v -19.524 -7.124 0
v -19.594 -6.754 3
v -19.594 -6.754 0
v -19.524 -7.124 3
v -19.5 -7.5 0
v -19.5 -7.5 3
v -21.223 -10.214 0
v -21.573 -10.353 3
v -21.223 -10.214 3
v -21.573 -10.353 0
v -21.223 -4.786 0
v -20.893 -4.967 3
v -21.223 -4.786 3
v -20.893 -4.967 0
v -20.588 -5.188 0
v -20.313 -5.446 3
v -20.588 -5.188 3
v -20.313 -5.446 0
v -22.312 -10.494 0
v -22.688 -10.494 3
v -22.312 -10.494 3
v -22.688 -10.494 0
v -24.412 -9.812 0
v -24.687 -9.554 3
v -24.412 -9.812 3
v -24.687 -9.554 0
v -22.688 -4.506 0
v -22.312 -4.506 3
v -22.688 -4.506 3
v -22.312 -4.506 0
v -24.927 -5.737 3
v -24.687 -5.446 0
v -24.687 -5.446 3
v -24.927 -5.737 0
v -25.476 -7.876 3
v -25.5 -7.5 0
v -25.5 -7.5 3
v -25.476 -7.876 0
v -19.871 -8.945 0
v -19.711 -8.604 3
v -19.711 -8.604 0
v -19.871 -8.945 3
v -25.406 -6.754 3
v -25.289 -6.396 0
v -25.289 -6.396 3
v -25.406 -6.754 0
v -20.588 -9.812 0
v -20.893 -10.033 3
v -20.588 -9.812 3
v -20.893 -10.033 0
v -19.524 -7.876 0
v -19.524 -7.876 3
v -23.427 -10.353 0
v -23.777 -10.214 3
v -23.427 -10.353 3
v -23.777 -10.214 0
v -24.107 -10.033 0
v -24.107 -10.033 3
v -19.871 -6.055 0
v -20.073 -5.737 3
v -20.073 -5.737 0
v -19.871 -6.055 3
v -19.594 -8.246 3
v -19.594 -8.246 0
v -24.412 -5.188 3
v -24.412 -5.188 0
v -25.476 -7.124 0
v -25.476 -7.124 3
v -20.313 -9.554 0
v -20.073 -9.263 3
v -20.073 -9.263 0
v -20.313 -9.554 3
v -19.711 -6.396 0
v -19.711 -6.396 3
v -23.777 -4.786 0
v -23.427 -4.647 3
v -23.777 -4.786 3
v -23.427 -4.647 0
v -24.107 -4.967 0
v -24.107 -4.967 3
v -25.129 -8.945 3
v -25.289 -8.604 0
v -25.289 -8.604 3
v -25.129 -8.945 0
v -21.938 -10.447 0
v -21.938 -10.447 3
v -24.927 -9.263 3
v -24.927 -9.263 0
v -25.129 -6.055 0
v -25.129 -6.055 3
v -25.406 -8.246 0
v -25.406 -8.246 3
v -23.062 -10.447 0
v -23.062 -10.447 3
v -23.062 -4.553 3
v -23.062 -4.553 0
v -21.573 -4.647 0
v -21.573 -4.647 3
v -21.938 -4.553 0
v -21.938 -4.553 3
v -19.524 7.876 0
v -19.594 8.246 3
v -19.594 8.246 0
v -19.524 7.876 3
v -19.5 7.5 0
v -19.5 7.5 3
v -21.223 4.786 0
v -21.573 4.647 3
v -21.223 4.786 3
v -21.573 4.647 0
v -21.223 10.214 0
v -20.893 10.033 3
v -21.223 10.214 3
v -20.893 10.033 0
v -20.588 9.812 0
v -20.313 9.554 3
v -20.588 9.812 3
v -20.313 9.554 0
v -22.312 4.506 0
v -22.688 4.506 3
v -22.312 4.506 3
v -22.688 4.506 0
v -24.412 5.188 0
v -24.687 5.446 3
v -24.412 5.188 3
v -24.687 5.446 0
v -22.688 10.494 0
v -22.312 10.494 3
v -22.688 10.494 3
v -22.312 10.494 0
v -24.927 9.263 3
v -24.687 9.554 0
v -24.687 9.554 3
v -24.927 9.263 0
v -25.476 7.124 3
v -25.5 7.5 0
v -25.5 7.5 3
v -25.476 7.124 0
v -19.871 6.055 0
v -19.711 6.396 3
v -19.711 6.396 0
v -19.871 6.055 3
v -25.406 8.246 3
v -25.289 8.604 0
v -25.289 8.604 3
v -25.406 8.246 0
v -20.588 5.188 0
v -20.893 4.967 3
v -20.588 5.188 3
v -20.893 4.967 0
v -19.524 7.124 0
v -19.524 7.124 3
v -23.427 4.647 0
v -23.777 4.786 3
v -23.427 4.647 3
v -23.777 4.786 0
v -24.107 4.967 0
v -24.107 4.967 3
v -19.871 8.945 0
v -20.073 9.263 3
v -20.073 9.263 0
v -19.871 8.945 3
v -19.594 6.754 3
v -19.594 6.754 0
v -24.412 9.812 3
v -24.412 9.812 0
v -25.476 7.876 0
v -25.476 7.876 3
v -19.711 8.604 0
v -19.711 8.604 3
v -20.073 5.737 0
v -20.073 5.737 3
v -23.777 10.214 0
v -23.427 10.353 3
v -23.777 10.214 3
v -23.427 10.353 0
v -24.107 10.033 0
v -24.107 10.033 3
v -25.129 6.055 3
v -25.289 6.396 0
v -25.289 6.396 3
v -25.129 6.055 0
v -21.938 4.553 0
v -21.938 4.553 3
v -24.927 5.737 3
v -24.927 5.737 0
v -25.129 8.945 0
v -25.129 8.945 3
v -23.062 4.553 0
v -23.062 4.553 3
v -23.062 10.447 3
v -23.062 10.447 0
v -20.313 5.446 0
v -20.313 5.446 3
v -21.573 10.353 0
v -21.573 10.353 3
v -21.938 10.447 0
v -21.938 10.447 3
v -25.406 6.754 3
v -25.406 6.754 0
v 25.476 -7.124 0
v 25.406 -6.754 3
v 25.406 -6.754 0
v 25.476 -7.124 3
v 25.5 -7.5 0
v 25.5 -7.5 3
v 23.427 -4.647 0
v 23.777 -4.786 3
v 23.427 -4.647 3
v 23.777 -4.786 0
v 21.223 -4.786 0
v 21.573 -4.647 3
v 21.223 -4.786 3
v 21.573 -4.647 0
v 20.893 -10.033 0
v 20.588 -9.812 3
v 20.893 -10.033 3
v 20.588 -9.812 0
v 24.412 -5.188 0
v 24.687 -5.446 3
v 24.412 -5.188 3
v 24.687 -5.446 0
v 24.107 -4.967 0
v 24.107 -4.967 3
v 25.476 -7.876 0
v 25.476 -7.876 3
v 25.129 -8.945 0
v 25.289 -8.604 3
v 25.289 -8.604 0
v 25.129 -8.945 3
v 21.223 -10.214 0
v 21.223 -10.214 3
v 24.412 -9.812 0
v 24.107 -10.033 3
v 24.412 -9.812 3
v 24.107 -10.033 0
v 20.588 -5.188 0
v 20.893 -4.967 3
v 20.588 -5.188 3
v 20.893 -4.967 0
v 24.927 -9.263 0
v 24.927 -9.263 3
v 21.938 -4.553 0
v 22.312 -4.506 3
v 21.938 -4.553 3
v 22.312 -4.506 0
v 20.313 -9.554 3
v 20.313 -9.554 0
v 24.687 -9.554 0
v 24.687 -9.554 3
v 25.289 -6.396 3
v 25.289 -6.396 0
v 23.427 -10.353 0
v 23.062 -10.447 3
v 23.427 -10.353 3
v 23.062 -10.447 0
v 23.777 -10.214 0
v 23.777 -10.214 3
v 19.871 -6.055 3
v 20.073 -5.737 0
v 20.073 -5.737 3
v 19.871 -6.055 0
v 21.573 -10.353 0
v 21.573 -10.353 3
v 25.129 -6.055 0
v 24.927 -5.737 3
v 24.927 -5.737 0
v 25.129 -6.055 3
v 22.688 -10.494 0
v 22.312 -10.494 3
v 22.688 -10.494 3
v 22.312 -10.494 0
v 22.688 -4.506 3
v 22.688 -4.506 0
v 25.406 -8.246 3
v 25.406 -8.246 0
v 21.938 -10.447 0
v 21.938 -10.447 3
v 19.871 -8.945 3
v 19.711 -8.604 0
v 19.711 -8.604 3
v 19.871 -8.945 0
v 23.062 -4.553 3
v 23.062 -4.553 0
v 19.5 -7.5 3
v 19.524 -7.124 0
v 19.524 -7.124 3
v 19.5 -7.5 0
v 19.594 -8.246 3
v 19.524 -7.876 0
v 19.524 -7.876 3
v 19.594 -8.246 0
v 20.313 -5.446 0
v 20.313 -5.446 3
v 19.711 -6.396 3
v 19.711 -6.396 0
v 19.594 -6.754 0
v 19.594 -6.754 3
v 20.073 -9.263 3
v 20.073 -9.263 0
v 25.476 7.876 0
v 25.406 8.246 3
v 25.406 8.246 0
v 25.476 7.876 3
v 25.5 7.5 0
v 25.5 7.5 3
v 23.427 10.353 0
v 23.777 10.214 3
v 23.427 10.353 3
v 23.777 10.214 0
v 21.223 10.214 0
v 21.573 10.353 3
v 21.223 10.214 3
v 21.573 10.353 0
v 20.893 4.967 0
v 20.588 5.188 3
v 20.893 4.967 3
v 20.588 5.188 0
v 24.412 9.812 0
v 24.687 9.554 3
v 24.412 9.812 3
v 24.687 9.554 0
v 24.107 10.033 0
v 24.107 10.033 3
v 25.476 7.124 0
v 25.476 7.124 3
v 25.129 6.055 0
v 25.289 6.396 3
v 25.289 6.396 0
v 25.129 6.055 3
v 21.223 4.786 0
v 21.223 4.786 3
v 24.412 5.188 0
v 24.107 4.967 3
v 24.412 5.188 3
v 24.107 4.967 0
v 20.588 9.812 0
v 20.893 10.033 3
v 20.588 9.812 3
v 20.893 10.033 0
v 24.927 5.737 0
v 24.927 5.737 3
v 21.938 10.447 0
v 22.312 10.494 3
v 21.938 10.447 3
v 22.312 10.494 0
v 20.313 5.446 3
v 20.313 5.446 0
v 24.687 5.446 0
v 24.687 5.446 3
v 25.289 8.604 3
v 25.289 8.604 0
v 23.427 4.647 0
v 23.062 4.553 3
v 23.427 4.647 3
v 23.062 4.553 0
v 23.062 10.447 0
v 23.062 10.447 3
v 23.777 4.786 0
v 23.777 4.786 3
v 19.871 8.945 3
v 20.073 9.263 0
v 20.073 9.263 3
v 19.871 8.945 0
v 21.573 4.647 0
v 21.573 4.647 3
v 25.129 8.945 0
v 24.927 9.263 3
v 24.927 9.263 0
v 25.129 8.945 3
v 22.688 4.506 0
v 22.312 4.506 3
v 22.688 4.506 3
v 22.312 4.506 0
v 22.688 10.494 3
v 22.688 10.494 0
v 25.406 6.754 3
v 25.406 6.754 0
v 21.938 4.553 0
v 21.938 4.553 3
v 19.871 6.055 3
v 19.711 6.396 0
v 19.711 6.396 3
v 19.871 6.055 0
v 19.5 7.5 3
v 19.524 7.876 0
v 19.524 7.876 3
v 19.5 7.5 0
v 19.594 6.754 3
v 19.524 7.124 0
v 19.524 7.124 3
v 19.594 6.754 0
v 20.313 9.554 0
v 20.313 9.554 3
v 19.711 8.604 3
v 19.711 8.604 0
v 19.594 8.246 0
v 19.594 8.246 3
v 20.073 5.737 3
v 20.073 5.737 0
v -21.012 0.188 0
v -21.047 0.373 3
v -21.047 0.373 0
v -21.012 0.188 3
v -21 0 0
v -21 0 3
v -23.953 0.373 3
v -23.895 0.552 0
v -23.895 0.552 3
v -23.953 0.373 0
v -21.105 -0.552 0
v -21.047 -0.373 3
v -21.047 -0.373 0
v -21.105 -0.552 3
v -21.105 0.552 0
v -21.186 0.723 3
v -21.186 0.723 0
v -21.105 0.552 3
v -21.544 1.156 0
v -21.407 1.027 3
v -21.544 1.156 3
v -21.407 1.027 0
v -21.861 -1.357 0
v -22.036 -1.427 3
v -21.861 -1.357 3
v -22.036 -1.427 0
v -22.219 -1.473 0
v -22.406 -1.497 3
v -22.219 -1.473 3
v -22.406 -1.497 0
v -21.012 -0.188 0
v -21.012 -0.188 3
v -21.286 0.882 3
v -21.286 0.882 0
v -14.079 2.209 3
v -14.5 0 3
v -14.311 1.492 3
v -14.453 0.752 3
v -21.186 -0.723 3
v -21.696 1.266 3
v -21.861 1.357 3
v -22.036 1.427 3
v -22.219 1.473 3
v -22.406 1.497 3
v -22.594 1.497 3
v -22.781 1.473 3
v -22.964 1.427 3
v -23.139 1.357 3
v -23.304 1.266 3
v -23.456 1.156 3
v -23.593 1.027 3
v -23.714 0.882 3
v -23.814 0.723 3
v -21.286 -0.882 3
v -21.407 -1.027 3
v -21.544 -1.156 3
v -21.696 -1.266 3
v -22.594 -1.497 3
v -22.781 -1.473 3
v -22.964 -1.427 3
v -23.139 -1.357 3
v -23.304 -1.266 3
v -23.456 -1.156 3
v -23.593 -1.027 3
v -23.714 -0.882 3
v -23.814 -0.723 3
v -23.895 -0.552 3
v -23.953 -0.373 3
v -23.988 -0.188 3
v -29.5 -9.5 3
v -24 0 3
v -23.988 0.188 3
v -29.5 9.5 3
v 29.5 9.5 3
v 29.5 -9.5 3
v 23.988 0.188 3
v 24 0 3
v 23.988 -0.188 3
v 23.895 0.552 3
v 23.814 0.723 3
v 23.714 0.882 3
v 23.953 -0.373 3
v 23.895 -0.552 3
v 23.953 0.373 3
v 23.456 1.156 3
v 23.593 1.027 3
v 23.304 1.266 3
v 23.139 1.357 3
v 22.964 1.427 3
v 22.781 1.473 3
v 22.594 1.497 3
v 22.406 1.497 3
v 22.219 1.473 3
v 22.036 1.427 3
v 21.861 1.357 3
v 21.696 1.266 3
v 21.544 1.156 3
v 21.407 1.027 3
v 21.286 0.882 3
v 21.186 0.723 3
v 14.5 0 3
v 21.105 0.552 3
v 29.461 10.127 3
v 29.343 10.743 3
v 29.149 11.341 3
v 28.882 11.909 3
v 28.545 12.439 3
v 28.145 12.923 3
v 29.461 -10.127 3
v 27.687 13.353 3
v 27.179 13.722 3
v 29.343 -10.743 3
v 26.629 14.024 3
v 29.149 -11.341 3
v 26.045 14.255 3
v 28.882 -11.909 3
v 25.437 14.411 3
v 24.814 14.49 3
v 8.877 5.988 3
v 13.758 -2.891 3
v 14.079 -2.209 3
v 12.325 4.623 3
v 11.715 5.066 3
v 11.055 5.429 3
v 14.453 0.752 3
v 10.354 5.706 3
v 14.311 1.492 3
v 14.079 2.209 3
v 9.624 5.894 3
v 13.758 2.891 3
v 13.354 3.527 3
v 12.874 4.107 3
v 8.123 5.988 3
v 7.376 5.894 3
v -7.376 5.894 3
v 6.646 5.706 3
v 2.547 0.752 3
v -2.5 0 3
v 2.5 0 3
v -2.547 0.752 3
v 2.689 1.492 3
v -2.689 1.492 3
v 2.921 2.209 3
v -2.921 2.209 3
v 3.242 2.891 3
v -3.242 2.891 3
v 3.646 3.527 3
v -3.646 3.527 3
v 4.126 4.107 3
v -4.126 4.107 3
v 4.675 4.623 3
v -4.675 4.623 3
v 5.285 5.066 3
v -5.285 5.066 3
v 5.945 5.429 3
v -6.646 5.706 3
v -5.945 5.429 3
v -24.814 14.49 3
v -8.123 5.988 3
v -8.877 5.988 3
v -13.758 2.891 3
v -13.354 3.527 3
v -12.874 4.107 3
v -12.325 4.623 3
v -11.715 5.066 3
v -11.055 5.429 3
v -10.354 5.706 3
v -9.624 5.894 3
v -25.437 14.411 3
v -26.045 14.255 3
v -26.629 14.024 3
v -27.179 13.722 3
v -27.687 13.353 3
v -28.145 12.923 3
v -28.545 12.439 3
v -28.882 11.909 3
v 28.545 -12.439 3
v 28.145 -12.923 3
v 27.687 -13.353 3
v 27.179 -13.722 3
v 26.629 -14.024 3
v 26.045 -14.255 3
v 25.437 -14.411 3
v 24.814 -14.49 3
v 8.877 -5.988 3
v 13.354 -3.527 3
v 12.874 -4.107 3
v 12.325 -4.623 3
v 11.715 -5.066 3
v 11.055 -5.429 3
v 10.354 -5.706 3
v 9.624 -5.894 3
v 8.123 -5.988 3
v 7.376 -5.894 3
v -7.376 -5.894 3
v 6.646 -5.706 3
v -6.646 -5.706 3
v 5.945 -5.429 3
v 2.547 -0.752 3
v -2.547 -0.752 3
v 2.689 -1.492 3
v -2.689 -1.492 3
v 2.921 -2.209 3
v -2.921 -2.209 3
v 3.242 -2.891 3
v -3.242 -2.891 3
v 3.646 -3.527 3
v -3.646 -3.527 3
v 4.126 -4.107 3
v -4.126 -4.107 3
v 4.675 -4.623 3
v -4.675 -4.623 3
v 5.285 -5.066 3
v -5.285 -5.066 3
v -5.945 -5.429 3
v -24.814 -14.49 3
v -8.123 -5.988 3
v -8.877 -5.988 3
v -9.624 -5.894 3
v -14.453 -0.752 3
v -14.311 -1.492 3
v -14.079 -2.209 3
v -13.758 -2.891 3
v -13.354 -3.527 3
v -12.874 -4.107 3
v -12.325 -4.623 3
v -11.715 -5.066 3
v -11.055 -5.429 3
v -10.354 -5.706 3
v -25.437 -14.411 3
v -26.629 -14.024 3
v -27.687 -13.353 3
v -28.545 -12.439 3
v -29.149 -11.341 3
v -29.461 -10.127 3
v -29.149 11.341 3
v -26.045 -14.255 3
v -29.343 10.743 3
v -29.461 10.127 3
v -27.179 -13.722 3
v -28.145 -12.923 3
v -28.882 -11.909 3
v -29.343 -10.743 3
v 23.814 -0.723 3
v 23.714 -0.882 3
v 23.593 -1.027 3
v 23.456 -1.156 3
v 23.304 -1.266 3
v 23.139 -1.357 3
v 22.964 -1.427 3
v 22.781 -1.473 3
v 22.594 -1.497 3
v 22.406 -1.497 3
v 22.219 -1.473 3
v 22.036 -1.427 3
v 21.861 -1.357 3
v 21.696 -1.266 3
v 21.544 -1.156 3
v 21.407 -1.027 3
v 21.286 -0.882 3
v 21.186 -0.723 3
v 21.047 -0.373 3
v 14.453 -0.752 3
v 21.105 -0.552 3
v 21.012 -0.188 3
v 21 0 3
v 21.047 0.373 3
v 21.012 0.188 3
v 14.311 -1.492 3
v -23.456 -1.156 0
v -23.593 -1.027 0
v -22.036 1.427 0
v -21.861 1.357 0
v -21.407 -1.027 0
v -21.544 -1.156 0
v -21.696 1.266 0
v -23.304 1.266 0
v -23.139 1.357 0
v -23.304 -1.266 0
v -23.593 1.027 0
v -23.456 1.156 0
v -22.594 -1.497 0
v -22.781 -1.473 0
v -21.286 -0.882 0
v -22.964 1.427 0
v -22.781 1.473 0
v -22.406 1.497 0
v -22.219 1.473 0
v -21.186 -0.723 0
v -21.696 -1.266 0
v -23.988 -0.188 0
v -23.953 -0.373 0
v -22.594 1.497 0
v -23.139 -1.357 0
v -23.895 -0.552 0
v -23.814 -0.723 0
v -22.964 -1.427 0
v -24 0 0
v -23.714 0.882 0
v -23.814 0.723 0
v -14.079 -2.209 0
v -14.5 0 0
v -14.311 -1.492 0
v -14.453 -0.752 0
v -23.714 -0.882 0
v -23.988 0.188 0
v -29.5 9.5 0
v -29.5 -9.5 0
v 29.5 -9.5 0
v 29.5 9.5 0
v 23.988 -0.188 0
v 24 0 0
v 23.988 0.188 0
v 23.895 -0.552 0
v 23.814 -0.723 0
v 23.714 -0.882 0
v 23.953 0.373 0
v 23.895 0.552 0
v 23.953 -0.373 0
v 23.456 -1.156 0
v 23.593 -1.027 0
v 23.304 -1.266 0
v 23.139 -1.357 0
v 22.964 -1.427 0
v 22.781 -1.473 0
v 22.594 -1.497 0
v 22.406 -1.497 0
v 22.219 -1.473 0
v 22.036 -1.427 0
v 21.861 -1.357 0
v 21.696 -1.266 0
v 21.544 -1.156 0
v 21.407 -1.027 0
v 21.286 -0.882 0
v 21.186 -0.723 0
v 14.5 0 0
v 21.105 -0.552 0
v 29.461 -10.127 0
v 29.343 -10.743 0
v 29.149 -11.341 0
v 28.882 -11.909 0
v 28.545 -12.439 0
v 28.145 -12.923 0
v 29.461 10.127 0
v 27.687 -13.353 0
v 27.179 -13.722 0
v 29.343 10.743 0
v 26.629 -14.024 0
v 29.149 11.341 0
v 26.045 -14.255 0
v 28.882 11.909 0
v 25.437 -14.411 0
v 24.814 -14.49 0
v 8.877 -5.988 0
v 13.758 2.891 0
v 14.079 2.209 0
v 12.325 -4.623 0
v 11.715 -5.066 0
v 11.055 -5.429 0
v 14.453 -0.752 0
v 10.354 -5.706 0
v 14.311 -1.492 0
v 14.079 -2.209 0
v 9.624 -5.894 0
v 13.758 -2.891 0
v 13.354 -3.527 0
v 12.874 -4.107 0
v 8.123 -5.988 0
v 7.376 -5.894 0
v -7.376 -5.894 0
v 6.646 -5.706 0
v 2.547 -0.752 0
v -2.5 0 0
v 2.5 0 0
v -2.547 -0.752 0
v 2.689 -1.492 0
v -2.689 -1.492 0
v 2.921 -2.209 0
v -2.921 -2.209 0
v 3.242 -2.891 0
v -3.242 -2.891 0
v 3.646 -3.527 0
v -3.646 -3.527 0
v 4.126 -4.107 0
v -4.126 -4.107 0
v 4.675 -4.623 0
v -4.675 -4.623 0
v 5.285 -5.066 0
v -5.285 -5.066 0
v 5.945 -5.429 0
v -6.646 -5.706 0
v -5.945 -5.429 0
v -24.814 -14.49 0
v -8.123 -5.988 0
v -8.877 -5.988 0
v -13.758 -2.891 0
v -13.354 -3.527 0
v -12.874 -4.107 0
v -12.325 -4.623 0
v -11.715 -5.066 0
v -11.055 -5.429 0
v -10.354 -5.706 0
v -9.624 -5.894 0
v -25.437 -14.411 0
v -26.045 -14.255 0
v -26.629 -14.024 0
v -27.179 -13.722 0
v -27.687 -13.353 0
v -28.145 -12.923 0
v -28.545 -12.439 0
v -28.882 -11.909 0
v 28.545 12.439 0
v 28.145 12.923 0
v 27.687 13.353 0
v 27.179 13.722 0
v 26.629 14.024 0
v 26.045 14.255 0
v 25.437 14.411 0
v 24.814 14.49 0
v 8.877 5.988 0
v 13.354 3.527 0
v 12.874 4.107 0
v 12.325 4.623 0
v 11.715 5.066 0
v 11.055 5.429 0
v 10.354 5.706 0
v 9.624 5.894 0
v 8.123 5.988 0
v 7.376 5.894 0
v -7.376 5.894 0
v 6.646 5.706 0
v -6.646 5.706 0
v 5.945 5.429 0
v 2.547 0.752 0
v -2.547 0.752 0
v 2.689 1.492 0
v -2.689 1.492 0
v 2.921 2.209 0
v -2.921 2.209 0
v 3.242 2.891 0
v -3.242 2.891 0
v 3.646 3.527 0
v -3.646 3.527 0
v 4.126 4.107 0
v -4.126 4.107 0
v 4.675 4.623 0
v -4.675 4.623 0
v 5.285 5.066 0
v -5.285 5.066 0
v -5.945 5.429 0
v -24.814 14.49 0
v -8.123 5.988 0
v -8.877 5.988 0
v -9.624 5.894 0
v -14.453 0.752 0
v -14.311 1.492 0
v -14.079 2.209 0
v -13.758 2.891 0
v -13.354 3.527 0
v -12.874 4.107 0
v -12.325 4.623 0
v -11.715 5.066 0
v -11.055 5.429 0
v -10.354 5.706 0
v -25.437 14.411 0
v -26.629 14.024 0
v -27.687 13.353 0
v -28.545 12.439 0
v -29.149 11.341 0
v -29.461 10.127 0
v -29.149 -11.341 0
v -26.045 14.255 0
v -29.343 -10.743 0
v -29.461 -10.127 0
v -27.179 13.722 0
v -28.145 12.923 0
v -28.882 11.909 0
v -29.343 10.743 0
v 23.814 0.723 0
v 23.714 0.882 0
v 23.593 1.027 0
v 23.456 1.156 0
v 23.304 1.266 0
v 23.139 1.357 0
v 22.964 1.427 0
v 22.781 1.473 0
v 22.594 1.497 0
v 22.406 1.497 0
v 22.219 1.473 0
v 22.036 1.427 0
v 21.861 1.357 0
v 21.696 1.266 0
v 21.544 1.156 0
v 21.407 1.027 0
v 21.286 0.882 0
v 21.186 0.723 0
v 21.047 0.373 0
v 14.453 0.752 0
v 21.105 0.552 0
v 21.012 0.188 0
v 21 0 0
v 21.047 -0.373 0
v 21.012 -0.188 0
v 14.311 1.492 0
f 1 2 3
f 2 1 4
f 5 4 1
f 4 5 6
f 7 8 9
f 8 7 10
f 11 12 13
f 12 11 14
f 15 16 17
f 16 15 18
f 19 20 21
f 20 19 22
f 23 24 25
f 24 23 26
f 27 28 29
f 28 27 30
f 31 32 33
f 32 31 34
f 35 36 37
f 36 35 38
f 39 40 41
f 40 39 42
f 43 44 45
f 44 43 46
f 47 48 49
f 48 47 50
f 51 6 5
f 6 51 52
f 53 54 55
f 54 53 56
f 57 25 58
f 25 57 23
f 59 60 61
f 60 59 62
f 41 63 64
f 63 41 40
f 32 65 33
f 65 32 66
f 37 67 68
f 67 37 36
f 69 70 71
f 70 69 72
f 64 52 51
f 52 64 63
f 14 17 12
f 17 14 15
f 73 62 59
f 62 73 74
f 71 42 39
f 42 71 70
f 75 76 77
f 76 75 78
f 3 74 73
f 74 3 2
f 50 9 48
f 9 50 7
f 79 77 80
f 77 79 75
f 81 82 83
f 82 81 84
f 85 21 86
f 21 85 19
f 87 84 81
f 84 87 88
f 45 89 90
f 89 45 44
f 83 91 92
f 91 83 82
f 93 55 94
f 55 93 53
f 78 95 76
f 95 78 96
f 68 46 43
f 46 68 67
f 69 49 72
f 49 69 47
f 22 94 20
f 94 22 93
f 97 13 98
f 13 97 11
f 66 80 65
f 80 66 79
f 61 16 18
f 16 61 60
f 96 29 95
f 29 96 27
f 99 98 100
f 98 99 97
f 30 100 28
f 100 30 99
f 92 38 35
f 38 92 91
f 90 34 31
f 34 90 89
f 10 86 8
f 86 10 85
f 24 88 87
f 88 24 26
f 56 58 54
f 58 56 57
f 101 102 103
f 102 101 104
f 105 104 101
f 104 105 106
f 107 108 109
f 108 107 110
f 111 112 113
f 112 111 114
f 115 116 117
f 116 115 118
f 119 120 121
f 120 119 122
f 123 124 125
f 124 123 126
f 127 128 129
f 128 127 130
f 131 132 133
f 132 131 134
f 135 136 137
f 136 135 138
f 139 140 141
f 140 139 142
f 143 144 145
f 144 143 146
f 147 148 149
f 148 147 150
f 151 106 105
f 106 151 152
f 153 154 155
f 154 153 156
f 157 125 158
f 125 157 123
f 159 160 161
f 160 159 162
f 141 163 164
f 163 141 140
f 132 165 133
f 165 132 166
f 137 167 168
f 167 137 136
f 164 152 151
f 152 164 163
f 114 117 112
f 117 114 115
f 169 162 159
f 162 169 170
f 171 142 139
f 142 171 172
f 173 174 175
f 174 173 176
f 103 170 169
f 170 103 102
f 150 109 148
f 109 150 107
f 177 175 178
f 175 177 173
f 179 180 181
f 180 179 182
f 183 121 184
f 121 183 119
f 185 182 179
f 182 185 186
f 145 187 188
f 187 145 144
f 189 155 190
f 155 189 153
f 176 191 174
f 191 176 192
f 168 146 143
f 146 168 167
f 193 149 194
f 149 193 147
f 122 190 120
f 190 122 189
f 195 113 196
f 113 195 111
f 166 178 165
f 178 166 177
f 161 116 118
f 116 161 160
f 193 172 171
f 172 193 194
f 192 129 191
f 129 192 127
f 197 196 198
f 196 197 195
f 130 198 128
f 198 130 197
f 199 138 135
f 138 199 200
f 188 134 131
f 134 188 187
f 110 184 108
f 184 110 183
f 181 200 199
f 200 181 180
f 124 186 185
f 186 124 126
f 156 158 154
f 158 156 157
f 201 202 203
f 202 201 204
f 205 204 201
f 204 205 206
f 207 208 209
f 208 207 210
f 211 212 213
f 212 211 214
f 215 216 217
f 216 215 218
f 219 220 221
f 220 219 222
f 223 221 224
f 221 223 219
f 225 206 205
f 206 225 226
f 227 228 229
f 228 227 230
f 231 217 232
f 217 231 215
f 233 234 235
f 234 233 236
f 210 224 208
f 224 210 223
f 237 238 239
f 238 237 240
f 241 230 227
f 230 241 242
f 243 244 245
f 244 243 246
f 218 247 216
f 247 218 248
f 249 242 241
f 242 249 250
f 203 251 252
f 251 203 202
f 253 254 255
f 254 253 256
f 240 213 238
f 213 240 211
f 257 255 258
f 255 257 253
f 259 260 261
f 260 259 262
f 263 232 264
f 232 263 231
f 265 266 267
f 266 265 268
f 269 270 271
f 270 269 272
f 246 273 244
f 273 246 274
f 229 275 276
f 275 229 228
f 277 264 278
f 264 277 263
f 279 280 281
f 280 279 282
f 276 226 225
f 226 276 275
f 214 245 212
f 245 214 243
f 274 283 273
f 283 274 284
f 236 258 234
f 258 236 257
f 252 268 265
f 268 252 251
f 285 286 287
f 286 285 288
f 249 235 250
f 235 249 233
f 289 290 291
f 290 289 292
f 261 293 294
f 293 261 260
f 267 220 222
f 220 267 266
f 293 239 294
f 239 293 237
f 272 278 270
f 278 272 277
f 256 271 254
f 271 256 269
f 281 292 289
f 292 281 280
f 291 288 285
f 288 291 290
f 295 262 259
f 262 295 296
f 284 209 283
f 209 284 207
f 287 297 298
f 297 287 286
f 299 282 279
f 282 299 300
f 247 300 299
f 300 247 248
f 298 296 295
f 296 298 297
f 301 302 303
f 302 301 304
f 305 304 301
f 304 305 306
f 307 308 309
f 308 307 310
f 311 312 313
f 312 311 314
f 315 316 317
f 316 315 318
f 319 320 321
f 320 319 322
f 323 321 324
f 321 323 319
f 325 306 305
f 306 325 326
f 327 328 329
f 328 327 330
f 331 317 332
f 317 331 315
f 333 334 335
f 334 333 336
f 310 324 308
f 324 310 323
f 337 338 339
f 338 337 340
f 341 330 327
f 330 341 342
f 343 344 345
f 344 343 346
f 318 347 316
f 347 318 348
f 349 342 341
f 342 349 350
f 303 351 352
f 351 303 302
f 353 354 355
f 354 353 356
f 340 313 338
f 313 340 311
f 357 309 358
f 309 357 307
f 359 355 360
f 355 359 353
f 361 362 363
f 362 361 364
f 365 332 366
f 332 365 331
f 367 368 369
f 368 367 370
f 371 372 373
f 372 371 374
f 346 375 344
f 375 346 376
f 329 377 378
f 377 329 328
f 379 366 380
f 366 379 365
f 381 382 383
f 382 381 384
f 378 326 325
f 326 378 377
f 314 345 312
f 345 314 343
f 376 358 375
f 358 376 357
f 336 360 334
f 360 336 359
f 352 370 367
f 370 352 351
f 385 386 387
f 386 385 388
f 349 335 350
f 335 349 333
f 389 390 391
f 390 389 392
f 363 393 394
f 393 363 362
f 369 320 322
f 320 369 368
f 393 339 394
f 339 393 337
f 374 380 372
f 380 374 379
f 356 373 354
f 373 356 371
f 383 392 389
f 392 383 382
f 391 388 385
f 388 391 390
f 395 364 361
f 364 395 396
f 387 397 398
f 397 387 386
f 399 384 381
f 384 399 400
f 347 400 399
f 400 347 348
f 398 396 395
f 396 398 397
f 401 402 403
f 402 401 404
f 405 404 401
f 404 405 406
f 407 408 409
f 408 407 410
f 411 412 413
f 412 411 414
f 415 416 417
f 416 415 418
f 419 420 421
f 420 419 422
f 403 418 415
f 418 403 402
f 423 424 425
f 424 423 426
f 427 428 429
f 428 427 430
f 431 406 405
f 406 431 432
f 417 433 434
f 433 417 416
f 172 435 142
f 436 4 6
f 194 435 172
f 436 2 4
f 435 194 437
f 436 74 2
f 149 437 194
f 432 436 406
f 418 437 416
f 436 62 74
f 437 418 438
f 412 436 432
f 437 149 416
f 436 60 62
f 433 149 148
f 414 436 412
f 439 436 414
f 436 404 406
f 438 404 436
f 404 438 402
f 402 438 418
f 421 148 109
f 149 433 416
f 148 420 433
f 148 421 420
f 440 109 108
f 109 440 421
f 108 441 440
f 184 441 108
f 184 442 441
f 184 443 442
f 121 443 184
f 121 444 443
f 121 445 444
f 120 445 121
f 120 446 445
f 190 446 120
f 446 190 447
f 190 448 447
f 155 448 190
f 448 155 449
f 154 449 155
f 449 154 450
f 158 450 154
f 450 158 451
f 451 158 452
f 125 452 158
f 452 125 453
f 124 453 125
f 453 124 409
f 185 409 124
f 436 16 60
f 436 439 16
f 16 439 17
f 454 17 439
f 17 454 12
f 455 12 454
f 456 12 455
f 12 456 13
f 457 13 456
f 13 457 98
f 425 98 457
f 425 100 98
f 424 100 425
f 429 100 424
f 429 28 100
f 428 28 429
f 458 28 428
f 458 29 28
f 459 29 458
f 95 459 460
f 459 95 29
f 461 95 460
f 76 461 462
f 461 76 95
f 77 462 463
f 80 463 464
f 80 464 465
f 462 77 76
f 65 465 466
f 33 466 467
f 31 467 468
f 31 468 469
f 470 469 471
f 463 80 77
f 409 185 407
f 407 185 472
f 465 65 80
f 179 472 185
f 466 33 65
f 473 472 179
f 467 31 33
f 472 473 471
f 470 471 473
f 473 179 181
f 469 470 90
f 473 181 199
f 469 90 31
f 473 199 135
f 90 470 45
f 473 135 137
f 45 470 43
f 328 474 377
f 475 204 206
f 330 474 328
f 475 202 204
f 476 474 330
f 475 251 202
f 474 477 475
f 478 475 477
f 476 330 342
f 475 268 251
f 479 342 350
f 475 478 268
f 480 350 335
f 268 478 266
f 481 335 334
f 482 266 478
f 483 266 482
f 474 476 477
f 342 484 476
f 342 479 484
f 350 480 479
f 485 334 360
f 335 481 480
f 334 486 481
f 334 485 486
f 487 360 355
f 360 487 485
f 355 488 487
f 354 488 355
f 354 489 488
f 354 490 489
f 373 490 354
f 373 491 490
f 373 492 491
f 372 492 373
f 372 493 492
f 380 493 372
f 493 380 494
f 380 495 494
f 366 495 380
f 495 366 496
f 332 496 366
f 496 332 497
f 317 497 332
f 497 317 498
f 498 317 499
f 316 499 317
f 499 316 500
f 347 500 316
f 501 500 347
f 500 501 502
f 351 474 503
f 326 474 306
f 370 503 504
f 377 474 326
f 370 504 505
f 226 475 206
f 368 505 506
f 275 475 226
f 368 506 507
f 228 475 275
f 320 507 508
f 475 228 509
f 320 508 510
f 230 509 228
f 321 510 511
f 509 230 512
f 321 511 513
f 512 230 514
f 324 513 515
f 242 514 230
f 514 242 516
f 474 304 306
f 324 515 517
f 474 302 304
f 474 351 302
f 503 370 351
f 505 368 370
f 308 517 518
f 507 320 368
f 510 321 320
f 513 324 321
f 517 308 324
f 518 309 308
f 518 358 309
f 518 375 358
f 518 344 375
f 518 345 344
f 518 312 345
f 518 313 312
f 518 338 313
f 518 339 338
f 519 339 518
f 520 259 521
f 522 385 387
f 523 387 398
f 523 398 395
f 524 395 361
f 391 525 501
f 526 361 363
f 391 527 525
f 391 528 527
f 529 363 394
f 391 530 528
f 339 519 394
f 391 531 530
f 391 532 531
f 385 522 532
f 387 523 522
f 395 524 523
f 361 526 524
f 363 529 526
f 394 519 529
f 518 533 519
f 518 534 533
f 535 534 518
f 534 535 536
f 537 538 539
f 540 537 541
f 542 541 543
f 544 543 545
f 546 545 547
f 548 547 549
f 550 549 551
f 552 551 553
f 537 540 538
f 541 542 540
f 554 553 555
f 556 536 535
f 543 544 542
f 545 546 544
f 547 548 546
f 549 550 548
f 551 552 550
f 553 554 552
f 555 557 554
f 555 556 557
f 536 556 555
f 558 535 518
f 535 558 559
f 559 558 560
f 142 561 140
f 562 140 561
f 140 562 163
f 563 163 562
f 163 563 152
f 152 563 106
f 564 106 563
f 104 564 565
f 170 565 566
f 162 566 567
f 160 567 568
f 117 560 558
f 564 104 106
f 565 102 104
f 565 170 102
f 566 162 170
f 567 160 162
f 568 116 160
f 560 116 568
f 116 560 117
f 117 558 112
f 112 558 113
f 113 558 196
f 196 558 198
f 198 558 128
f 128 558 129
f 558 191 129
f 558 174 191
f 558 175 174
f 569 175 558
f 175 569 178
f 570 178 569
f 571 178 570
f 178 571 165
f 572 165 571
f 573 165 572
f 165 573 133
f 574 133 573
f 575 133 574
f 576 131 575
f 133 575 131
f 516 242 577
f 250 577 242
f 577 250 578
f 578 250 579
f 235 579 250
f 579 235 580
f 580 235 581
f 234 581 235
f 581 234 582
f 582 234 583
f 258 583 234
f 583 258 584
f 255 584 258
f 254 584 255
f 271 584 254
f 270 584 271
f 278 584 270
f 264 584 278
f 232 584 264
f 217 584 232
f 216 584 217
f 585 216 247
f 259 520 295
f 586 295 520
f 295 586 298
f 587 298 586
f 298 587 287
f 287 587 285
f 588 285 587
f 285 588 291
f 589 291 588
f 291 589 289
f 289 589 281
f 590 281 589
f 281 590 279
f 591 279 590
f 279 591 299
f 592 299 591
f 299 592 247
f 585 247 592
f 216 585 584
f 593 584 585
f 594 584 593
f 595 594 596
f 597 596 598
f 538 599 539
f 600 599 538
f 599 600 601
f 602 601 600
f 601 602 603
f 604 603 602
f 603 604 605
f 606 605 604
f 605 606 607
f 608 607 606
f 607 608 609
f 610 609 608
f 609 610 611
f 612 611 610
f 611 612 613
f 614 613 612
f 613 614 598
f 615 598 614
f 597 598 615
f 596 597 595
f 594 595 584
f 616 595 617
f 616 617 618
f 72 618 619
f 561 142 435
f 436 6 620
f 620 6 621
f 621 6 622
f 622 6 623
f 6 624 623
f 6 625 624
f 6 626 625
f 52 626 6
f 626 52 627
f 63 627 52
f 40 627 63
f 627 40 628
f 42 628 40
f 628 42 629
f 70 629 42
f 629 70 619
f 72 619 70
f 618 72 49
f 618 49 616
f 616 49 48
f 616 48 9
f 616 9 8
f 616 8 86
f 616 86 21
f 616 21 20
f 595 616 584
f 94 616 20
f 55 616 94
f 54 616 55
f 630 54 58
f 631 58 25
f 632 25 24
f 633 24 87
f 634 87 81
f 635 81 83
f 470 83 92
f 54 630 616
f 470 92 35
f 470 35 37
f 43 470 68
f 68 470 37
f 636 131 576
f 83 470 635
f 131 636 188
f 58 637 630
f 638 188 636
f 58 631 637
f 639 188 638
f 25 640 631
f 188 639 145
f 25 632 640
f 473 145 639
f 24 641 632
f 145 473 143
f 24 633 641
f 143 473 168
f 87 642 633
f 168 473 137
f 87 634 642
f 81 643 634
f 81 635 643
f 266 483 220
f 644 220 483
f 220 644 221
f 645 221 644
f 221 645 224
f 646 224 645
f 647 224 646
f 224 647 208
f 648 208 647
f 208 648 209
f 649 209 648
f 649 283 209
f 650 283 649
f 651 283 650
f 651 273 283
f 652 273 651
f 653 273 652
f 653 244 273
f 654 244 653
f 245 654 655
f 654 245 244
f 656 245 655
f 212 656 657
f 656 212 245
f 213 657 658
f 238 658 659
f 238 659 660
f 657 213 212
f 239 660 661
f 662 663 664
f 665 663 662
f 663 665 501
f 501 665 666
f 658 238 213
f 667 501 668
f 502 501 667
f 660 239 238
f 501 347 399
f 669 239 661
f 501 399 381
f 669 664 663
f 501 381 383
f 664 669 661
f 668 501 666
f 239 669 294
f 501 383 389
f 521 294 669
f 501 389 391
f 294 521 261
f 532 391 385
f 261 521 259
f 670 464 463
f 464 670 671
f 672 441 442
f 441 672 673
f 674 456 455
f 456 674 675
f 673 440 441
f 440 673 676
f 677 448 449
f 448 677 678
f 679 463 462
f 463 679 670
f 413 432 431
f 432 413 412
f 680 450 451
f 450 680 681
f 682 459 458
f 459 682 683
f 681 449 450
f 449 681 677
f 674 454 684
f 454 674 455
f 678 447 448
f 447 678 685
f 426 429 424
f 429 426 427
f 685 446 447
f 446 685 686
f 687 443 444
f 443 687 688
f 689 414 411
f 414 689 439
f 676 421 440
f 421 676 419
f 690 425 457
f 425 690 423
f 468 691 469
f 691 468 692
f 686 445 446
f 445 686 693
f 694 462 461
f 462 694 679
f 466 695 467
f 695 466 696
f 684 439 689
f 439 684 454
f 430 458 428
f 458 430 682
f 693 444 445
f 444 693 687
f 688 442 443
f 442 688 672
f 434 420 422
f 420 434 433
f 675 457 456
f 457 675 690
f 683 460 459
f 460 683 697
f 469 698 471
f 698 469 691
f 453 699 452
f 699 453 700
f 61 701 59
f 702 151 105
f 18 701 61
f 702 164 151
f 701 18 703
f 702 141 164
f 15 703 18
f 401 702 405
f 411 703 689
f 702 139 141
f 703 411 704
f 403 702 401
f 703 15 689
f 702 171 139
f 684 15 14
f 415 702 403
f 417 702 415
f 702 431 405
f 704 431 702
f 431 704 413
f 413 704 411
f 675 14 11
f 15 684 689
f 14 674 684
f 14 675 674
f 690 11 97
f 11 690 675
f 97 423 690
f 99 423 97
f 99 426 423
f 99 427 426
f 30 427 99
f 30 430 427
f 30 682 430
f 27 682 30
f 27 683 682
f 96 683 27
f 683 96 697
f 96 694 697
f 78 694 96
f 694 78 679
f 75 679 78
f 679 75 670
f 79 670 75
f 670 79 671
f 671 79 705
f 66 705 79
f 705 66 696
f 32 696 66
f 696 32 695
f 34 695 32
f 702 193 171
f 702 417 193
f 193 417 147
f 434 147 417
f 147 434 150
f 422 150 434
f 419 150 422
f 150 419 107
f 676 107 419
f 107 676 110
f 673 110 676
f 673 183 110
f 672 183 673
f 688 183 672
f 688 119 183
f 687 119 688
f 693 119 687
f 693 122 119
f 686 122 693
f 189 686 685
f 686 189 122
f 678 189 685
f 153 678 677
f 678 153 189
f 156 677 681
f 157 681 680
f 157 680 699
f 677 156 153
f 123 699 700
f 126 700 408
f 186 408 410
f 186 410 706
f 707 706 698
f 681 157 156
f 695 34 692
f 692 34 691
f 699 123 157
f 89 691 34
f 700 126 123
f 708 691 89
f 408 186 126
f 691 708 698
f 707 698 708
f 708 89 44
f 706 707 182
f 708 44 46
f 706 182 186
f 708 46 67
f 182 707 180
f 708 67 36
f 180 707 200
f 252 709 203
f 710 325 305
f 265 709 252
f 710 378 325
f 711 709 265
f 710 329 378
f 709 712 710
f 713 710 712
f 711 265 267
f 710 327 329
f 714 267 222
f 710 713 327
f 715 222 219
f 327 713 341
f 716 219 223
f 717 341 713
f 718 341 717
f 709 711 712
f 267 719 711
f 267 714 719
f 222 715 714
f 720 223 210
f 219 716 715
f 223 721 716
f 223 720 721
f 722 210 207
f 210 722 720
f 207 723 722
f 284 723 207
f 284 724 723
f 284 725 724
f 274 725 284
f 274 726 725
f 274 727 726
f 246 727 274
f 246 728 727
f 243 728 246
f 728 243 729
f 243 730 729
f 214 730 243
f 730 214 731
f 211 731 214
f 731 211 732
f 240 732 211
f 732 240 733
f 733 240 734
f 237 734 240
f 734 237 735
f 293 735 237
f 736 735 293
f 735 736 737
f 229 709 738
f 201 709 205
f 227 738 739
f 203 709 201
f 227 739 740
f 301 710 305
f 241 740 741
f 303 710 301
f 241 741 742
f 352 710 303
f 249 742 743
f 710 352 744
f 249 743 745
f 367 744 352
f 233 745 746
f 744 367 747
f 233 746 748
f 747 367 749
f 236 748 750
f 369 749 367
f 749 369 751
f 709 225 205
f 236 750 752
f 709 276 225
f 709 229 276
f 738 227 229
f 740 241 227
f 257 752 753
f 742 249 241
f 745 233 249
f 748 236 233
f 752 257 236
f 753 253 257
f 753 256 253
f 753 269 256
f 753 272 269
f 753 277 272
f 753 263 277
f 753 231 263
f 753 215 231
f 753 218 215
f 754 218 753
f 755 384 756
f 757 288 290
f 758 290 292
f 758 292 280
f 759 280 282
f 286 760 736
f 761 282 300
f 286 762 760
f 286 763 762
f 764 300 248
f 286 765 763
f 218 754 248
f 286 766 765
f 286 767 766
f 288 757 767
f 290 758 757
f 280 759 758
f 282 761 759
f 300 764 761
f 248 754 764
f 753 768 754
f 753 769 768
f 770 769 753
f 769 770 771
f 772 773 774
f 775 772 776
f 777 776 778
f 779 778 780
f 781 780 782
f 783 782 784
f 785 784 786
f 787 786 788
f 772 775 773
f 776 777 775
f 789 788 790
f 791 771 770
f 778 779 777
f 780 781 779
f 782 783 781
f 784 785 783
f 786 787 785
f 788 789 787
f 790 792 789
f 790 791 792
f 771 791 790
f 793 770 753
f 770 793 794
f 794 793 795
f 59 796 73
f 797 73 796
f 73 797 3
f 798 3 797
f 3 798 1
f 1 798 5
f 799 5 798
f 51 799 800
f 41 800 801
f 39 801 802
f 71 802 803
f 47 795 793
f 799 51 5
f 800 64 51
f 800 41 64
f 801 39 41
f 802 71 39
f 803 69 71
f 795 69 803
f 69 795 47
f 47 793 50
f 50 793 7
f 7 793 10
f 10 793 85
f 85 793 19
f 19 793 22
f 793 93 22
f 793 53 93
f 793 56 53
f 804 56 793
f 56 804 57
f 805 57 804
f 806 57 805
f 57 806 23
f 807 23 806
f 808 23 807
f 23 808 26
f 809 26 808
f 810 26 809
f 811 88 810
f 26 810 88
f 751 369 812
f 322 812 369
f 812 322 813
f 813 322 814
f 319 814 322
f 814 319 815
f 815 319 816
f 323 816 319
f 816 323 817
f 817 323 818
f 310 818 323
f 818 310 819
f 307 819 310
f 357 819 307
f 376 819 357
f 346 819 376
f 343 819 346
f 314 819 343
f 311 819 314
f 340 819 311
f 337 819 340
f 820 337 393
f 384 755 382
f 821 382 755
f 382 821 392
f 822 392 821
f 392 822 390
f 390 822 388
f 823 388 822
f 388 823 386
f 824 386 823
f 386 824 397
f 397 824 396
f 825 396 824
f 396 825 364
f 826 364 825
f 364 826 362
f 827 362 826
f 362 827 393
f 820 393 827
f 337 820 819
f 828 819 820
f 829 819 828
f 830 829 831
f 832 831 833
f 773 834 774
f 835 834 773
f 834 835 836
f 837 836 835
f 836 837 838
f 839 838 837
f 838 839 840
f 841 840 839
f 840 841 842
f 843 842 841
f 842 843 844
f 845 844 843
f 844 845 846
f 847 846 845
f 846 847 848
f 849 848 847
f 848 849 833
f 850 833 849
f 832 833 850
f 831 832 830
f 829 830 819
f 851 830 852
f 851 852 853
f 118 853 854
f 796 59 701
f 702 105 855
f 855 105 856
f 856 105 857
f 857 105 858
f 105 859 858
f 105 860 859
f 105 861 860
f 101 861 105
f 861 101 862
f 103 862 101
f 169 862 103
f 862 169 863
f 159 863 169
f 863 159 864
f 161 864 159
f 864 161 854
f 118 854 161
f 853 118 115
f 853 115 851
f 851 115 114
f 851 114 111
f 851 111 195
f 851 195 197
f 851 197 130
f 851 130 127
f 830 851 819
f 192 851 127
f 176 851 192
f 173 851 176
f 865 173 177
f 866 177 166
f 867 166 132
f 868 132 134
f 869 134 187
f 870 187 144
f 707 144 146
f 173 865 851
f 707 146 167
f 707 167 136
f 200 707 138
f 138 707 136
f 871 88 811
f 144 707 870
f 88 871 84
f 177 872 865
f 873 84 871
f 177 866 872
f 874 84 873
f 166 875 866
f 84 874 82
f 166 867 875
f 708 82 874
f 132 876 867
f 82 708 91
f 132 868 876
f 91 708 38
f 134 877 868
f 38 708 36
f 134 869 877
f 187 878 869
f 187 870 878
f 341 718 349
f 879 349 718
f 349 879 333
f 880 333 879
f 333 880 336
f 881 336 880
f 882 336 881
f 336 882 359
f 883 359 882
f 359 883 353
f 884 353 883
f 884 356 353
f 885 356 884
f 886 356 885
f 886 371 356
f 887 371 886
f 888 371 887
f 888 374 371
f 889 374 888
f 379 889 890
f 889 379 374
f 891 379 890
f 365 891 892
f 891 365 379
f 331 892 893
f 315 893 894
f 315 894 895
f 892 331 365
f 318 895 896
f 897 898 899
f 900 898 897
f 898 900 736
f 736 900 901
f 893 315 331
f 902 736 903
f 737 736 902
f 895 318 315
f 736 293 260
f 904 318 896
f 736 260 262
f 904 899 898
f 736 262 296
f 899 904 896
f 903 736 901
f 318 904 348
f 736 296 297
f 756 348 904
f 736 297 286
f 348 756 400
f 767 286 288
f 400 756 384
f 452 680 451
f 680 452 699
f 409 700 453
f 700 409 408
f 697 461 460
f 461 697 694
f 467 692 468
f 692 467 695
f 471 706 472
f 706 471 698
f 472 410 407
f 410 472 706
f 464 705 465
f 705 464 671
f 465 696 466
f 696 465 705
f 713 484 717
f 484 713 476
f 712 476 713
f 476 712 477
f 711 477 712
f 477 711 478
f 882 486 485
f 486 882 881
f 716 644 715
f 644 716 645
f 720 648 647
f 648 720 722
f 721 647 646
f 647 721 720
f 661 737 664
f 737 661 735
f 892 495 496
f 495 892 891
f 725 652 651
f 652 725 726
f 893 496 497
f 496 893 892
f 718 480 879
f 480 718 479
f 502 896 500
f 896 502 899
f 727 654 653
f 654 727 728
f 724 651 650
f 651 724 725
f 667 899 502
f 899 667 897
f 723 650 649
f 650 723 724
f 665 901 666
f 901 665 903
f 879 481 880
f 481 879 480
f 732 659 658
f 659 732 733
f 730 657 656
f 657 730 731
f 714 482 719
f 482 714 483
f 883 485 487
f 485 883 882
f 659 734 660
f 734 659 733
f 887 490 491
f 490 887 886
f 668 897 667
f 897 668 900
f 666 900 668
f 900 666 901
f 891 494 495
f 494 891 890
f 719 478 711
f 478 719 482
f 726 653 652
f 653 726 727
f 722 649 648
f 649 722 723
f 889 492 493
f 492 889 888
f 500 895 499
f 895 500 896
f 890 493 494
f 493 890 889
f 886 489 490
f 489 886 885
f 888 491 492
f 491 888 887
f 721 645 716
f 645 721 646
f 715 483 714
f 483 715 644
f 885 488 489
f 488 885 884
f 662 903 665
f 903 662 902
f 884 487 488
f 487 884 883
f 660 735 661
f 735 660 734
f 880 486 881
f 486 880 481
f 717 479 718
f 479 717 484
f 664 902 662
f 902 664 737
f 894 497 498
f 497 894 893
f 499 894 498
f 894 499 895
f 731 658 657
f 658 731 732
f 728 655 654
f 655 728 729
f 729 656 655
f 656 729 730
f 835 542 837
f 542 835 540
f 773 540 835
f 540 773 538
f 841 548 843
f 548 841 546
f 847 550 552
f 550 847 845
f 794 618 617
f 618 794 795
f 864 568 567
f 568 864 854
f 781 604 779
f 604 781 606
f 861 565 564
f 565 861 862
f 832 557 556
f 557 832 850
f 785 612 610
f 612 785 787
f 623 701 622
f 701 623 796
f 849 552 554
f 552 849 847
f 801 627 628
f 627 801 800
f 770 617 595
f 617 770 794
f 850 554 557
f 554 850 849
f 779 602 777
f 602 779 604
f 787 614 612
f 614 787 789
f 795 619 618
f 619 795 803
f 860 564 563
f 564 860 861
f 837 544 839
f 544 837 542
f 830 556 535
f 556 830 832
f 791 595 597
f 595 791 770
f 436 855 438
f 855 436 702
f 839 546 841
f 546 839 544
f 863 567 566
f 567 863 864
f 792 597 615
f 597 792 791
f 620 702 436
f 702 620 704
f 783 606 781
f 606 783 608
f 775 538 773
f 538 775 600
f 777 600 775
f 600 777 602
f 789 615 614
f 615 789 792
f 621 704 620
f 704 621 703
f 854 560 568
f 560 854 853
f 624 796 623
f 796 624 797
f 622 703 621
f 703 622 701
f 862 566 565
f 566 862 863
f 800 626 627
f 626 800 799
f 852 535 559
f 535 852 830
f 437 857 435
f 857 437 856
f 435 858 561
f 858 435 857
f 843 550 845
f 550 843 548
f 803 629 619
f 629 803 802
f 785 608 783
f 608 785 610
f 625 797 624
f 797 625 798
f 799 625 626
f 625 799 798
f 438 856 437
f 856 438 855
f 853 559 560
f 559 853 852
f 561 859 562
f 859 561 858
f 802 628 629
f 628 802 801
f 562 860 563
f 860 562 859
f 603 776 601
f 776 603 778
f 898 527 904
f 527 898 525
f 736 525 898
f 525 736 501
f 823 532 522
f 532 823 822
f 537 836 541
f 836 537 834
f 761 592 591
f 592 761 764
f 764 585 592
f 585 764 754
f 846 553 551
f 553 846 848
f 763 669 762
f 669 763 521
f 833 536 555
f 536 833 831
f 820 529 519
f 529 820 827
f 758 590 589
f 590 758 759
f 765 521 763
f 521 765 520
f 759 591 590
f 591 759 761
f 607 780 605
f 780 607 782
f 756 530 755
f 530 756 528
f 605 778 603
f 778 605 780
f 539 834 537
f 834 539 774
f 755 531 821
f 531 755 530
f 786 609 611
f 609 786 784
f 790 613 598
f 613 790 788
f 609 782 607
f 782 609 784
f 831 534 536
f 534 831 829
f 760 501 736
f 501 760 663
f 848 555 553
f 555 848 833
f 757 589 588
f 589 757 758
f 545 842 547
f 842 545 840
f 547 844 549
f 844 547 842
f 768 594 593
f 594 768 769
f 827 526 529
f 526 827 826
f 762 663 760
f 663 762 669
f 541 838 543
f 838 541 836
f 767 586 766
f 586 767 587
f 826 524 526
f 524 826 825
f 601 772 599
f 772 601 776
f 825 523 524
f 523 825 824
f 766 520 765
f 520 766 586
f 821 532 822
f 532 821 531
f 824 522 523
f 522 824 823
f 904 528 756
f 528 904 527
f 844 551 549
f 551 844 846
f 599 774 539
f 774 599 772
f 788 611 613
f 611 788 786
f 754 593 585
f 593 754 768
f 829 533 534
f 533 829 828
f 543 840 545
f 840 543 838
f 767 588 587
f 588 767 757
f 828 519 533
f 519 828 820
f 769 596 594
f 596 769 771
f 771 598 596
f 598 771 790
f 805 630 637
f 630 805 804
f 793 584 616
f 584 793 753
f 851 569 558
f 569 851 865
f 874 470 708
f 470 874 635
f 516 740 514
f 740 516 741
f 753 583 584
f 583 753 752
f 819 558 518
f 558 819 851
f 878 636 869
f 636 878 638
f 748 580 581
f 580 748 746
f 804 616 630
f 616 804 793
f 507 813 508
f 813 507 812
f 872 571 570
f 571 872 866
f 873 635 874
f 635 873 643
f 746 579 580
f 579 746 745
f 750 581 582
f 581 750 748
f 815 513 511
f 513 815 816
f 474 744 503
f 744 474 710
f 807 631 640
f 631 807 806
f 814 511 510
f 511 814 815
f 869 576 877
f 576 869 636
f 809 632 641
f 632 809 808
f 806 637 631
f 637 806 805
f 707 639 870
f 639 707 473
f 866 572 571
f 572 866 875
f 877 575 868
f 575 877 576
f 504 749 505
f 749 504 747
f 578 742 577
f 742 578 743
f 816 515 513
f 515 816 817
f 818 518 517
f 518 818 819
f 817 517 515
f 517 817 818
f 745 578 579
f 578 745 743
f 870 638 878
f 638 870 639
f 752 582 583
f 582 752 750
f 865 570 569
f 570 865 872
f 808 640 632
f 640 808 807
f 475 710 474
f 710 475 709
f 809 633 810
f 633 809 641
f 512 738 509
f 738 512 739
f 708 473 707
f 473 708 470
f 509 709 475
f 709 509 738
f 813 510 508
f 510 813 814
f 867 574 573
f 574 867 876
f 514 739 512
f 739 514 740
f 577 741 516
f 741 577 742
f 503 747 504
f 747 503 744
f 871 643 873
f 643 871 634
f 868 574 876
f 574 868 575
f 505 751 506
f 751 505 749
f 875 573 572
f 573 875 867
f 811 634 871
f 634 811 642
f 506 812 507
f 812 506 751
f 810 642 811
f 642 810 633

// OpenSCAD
$fn = 50;


difference() {
	union() {
		hull() {
			translate(v = [-24.5000000000, 9.5000000000, 0]) {
				cylinder(h = 3, r = 5);
			}
			translate(v = [24.5000000000, 9.5000000000, 0]) {
				cylinder(h = 3, r = 5);
			}
			translate(v = [-24.5000000000, -9.5000000000, 0]) {
				cylinder(h = 3, r = 5);
			}
			translate(v = [24.5000000000, -9.5000000000, 0]) {
				cylinder(h = 3, r = 5);
			}
		}
	}
	union() {
		#translate(v = [-22.5000000000, -7.5000000000, 0]) {
			cylinder(h = 3, r = 3.0000000000);
		}
		#translate(v = [-22.5000000000, 7.5000000000, 0]) {
			cylinder(h = 3, r = 3.0000000000);
		}
		#translate(v = [22.5000000000, -7.5000000000, 0]) {
			cylinder(h = 3, r = 3.0000000000);
		}
		#translate(v = [22.5000000000, 7.5000000000, 0]) {
			cylinder(h = 3, r = 3.0000000000);
		}
		#translate(v = [-22.5000000000, -7.5000000000, -100.0000000000]) {
			cylinder(h = 200, r = 3.0000000000);
		}
		#translate(v = [-22.5000000000, 7.5000000000, -100.0000000000]) {
			cylinder(h = 200, r = 3.0000000000);
		}
		#translate(v = [22.5000000000, -7.5000000000, -100.0000000000]) {
			cylinder(h = 200, r = 3.0000000000);
		}
		#translate(v = [22.5000000000, 7.5000000000, -100.0000000000]) {
			cylinder(h = 200, r = 3.0000000000);
		}
		#translate(v = [-22.5000000000, -7.5000000000, 0]) {
			cylinder(h = 3, r = 1.5000000000);
		}
		#translate(v = [-22.5000000000, 0.0000000000, 0]) {
			cylinder(h = 3, r = 1.5000000000);
		}
		#translate(v = [-22.5000000000, 7.5000000000, 0]) {
			cylinder(h = 3, r = 1.5000000000);
		}
		#translate(v = [22.5000000000, -7.5000000000, 0]) {
			cylinder(h = 3, r = 1.5000000000);
		}
		#translate(v = [22.5000000000, 0.0000000000, 0]) {
			cylinder(h = 3, r = 1.5000000000);
		}
		#translate(v = [22.5000000000, 7.5000000000, 0]) {
			cylinder(h = 3, r = 1.5000000000);
		}
		#translate(v = [-22.5000000000, -7.5000000000, 0]) {
			cylinder(h = 3, r = 1.5000000000);
		}
		#translate(v = [-22.5000000000, 0.0000000000, 0]) {
			cylinder(h = 3, r = 1.5000000000);
		}
		#translate(v = [-22.5000000000, 7.5000000000, 0]) {
			cylinder(h = 3, r = 1.5000000000);
		}
		#translate(v = [22.5000000000, -7.5000000000, 0]) {
			cylinder(h = 3, r = 1.5000000000);
		}
		#translate(v = [22.5000000000, 0.0000000000, 0]) {
			cylinder(h = 3, r = 1.5000000000);
		}
		#translate(v = [22.5000000000, 7.5000000000, 0]) {
			cylinder(h = 3, r = 1.5000000000);
		}
		#translate(v = [-22.5000000000, -7.5000000000, 0]) {
			cylinder(h = 3, r = 1.5000000000);
		}
		#translate(v = [-22.5000000000, 0.0000000000, 0]) {
			cylinder(h = 3, r = 1.5000000000);
		}
		#translate(v = [-22.5000000000, 7.5000000000, 0]) {
			cylinder(h = 3, r = 1.5000000000);
		}
		#translate(v = [22.5000000000, -7.5000000000, 0]) {
			cylinder(h = 3, r = 1.5000000000);
		}
		#translate(v = [22.5000000000, 0.0000000000, 0]) {
			cylinder(h = 3, r = 1.5000000000);
		}
		#translate(v = [22.5000000000, 7.5000000000, 0]) {
			cylinder(h = 3, r = 1.5000000000);
		}
		#translate(v = [-8.5000000000, 0, 0]) {
			cylinder(h = 3, r = 6.0000000000);
		}
		#translate(v = [8.5000000000, 0, 0]) {
			cylinder(h = 3, r = 6.0000000000);
		}
	}
}
